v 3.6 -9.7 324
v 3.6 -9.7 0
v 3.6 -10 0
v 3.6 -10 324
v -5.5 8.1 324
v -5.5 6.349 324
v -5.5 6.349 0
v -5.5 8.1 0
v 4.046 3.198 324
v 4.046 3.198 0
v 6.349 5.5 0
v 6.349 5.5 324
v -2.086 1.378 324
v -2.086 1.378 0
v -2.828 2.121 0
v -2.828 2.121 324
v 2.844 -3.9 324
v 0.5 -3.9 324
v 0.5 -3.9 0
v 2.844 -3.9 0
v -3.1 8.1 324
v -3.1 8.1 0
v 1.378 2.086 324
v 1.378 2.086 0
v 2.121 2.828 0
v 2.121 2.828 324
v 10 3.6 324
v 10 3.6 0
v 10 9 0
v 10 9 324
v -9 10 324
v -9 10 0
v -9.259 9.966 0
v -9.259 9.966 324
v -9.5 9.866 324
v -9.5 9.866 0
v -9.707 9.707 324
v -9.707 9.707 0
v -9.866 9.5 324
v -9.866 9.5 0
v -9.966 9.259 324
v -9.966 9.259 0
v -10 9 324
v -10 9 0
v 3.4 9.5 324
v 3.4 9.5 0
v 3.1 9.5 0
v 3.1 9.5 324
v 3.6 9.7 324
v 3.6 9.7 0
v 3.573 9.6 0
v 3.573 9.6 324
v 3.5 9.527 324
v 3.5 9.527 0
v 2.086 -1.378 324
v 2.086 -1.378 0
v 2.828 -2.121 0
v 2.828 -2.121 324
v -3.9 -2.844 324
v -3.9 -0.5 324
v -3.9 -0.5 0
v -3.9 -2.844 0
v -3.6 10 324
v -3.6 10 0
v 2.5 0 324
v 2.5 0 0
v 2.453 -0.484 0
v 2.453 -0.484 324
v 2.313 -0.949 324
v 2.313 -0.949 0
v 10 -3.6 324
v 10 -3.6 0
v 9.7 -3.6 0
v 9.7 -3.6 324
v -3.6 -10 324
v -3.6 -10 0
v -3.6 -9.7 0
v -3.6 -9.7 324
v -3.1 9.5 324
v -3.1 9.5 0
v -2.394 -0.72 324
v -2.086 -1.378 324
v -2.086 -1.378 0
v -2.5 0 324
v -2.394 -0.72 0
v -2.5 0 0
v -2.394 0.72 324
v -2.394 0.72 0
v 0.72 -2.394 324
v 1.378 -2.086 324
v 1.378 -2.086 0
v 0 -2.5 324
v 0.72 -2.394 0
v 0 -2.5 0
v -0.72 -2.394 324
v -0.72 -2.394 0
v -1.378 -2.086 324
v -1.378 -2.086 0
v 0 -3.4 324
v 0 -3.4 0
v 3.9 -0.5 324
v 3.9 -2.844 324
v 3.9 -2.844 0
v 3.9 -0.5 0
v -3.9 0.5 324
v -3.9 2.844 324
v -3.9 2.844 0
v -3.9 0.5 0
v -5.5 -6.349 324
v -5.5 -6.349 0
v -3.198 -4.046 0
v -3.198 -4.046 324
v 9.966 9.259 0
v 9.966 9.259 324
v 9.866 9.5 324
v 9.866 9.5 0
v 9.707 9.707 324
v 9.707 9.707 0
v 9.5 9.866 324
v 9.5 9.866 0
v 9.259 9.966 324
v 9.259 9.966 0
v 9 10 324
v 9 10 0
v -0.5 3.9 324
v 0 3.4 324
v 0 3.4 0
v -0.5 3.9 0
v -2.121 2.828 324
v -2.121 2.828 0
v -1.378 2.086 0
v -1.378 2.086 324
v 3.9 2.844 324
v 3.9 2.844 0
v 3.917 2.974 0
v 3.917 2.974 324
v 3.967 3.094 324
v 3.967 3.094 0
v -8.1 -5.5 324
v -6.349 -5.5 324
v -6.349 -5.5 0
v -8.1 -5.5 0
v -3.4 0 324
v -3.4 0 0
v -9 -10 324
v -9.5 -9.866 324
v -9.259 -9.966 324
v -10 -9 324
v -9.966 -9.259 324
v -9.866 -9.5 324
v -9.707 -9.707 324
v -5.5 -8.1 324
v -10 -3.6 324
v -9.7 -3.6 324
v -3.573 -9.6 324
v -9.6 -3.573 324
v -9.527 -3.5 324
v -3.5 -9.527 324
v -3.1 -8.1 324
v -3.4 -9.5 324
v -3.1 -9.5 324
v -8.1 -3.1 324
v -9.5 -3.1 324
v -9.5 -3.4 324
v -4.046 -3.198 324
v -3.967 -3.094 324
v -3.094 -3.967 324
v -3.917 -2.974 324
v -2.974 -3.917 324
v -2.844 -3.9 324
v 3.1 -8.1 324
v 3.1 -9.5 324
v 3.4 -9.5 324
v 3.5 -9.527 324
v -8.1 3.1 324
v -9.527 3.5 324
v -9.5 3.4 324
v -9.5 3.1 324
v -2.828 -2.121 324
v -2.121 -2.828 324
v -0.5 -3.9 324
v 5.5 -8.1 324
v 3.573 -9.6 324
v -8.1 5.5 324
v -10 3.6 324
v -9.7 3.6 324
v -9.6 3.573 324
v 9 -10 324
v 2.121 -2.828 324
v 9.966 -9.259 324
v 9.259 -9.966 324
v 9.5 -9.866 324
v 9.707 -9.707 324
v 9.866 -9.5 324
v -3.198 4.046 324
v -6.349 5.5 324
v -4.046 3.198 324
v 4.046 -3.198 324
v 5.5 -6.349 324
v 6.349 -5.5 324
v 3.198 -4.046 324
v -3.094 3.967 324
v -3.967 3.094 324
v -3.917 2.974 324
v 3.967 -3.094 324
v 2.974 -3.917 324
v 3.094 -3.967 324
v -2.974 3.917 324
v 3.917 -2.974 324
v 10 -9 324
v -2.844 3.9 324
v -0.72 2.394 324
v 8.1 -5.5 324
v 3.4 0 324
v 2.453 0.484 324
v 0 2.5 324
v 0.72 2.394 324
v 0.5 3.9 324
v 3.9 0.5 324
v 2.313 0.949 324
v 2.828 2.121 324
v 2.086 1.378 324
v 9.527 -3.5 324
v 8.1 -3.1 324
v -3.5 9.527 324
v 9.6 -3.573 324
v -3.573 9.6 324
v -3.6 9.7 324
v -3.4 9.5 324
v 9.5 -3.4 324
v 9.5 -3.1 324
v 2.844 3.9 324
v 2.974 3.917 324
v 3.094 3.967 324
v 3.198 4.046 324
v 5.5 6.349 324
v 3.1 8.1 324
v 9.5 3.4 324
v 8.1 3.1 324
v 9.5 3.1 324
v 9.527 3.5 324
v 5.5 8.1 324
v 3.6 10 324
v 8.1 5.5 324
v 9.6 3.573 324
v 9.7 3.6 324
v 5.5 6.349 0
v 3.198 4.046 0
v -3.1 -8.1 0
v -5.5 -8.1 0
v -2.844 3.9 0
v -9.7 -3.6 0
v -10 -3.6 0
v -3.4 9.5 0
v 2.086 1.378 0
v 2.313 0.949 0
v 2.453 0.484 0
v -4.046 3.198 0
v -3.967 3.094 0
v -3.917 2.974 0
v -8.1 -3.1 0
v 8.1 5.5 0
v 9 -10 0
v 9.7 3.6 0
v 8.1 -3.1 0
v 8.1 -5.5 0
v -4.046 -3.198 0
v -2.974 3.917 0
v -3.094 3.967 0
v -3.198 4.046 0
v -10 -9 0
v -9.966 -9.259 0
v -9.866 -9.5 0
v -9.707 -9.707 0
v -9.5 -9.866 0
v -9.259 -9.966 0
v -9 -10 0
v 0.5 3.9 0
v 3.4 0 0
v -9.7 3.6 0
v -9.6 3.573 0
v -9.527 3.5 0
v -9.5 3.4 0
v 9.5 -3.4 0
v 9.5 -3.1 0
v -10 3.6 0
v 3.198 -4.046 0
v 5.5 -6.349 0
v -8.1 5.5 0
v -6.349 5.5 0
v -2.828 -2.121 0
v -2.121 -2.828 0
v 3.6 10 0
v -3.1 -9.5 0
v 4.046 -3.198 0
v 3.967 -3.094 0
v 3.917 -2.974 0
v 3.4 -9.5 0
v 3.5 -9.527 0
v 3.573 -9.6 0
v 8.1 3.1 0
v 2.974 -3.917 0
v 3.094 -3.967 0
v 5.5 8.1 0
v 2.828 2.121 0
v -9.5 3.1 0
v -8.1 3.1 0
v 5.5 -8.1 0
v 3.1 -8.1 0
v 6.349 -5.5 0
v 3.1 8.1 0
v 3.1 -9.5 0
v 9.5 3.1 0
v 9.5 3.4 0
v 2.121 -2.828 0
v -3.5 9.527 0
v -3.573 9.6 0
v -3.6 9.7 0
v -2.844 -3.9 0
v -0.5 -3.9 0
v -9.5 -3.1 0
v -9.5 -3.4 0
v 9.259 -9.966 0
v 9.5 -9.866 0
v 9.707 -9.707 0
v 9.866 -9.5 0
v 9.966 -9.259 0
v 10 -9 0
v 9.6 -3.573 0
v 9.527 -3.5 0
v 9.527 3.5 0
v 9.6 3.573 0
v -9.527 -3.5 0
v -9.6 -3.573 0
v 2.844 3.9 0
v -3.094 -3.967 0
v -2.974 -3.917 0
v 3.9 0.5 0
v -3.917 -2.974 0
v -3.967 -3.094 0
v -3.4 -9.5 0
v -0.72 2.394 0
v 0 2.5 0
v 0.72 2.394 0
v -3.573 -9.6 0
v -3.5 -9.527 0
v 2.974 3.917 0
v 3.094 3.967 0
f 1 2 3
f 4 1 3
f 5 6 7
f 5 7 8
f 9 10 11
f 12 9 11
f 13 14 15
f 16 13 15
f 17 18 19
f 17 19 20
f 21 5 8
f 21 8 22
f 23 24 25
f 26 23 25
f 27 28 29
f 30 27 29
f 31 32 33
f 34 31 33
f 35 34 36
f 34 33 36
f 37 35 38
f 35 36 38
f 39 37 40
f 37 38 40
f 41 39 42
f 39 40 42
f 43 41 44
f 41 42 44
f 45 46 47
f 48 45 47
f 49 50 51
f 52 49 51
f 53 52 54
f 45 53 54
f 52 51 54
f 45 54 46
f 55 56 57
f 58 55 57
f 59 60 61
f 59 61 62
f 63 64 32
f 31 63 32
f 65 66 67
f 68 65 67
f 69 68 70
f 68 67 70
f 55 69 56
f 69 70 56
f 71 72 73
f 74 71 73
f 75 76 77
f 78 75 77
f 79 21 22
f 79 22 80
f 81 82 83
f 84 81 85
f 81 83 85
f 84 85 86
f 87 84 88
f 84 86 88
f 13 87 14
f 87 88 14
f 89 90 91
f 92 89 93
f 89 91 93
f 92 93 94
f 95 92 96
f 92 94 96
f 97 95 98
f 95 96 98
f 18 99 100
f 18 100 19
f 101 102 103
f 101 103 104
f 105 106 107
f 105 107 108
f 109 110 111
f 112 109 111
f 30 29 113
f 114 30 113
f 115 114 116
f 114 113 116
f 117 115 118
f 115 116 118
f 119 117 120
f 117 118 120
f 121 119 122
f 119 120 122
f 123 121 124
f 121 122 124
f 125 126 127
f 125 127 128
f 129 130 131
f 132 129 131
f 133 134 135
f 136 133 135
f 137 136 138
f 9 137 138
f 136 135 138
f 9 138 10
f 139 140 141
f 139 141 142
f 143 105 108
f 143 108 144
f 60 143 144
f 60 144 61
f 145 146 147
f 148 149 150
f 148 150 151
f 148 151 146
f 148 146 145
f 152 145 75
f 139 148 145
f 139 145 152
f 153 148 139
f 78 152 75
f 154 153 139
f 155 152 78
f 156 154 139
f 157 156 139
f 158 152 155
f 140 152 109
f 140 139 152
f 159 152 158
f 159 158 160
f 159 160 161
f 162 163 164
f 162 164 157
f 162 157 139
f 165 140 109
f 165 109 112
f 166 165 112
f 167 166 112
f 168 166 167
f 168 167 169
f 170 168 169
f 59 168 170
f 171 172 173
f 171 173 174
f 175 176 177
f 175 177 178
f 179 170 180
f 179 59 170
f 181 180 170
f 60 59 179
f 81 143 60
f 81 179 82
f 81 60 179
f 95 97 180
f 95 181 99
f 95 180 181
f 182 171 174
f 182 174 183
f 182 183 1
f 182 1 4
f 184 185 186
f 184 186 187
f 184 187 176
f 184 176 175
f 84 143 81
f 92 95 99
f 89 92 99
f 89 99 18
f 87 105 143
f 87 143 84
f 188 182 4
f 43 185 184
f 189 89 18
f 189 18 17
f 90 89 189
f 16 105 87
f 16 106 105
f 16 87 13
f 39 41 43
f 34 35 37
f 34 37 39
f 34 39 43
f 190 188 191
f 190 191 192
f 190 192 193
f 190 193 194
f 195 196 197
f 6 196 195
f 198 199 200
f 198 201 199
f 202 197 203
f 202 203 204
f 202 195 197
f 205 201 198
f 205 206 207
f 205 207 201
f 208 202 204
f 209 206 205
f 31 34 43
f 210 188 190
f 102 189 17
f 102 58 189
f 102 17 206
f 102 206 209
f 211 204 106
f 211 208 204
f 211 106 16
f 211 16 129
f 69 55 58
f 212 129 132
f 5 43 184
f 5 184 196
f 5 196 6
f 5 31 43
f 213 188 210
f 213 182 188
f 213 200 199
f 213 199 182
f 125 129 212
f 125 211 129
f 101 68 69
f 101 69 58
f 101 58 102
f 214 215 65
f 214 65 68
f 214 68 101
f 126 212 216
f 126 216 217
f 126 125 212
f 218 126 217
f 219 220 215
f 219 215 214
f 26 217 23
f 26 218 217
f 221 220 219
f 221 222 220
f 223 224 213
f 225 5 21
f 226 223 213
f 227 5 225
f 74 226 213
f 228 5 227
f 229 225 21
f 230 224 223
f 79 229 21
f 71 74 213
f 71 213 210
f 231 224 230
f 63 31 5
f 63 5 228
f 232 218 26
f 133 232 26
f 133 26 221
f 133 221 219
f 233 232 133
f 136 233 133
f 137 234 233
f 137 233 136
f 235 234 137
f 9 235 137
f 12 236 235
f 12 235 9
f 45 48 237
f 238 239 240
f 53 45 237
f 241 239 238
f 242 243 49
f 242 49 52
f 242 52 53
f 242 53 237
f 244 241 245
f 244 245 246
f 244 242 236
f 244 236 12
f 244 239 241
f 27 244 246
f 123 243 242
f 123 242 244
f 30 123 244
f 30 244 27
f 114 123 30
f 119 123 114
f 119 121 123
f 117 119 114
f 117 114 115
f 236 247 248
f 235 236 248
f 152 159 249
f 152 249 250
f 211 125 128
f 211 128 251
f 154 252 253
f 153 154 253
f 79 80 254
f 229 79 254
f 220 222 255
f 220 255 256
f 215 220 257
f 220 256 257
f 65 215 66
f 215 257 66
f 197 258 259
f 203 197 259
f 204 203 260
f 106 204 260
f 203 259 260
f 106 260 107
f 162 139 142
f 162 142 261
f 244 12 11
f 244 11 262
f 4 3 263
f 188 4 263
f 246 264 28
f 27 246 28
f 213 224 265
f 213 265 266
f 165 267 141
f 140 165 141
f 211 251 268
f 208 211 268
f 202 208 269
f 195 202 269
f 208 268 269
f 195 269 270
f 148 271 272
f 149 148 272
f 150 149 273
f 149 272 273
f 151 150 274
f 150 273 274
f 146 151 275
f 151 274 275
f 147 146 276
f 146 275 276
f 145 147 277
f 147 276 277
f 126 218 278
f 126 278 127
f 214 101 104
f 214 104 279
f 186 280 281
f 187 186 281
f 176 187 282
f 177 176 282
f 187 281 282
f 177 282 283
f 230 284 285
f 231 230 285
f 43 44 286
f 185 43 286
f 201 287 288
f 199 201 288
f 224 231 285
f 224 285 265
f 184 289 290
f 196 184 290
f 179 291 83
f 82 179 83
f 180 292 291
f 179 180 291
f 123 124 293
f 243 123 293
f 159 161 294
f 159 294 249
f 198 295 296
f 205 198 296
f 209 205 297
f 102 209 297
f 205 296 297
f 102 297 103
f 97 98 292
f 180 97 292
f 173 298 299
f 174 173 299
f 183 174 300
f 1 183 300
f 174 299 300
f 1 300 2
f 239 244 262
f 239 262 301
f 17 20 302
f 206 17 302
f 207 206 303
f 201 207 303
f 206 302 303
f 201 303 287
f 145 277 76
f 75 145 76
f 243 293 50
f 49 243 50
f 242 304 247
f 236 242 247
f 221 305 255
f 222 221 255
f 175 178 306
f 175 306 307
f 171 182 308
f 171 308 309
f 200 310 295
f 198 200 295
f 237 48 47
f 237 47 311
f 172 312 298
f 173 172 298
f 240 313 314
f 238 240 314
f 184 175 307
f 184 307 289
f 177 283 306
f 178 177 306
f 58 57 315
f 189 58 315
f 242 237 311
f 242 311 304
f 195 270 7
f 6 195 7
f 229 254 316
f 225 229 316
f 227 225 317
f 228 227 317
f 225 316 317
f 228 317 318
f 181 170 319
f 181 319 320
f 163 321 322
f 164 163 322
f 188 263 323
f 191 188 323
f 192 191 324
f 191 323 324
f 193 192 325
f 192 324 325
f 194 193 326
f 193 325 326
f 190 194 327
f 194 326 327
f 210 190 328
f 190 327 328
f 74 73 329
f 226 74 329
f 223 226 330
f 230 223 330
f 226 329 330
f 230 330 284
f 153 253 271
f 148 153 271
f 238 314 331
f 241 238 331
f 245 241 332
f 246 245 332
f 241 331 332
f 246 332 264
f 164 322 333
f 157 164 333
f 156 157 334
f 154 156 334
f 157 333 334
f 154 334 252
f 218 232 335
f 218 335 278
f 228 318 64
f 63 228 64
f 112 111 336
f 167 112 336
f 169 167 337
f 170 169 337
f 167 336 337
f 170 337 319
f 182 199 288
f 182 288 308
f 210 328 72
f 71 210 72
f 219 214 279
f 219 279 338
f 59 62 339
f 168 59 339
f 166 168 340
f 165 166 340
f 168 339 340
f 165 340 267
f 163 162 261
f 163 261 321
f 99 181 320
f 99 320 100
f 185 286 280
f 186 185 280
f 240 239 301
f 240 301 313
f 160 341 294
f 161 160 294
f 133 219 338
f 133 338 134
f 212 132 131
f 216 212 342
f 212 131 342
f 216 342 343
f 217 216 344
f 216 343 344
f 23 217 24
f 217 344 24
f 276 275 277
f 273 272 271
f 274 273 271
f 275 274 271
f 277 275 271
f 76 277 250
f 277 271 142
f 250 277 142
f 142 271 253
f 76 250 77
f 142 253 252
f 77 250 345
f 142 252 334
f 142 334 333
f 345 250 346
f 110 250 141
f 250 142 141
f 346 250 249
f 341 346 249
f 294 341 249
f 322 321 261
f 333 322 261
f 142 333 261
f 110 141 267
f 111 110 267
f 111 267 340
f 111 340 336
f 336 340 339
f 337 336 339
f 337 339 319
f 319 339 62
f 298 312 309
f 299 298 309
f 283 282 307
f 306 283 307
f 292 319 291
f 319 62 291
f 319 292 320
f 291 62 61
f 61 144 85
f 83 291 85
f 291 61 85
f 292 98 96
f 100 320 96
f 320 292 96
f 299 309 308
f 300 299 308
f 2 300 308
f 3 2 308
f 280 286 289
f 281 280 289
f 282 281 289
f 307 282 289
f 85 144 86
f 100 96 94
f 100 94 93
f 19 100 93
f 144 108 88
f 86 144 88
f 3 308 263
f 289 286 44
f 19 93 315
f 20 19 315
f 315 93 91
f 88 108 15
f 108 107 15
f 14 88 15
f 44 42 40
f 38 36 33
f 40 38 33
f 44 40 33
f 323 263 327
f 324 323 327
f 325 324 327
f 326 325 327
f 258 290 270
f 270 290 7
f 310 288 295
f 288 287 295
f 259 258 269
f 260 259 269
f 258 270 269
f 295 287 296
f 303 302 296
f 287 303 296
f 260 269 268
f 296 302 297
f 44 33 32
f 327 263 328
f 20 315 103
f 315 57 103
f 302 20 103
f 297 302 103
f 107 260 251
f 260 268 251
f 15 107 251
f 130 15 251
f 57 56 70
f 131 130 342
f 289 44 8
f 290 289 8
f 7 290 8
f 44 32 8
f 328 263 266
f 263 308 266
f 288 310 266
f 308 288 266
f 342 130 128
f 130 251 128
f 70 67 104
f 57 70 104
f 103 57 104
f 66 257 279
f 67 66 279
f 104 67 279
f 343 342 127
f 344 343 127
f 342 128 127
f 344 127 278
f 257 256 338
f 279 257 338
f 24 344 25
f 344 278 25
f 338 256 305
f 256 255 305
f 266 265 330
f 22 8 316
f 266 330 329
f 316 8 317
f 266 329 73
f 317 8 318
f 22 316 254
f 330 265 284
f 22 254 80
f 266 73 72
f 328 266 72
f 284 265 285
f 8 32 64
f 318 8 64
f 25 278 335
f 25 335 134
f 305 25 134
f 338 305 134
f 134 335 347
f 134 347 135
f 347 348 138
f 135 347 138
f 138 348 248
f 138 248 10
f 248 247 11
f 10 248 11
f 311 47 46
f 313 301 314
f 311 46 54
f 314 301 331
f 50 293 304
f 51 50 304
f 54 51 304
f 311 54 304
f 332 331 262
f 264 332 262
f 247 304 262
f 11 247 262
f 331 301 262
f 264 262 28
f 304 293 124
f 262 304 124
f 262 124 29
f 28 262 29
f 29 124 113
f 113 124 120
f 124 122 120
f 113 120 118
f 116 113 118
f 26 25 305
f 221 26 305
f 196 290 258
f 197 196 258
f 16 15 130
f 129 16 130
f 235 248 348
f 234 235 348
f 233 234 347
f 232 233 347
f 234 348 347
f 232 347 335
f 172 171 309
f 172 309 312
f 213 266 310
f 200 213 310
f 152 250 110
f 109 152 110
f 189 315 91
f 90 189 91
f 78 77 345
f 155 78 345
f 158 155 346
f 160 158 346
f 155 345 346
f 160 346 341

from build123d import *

# Parameters (mm, degrees)
EXTRUDE1_DEPTH = 324


with BuildPart() as part:
    # Sketch1 → Extrude1 (new body)
    with BuildSketch(Plane.XY):
        with BuildLine():
            Line((0, 3.4), (-0.5, 3.9))
            Line((-0.5, 3.9), (-2.844365081, 3.9))
            ThreePointArc((-2.844365081, 3.9), (-3.035706798, 3.938060234), (-3.197918472, 4.046446609))
            Line((-3.197918472, 4.046446609), (-5.5, 6.348528137))
            Line((-5.5, 6.348528137), (-5.5, 8.1))
            Line((-5.5, 8.1), (-3.1, 8.1))
            Line((-3.1, 8.1), (-3.1, 9.5))
            Line((-3.1, 9.5), (-3.4, 9.5))
            ThreePointArc((-3.4, 9.5), (-3.541421356, 9.558578644), (-3.6, 9.7))
            Line((-3.6, 9.7), (-3.6, 10))
            Line((-3.6, 10), (-9, 10))
            ThreePointArc((-9, 10), (-9.707106781, 9.707106781), (-10, 9))
            Line((-10, 9), (-10, 3.6))
            Line((-10, 3.6), (-9.7, 3.6))
            ThreePointArc((-9.7, 3.6), (-9.558578644, 3.541421356), (-9.5, 3.4))
            Line((-9.5, 3.4), (-9.5, 3.1))
            Line((-9.5, 3.1), (-8.1, 3.1))
            Line((-8.1, 3.1), (-8.1, 5.5))
            Line((-8.1, 5.5), (-6.348528137, 5.5))
            Line((-6.348528137, 5.5), (-4.046446609, 3.197918472))
            ThreePointArc((-4.046446609, 3.197918472), (-3.938060234, 3.035706798), (-3.9, 2.844365081))
            Line((-3.9, 2.844365081), (-3.9, 0.5))
            Line((-3.9, 0.5), (-3.4, 0))
            Line((-3.4, 0), (-3.9, -0.5))
            Line((-3.9, -0.5), (-3.9, -2.844365081))
            ThreePointArc((-3.9, -2.844365081), (-3.938060234, -3.035706798), (-4.046446609, -3.197918472))
            Line((-4.046446609, -3.197918472), (-6.348528137, -5.5))
            Line((-6.348528137, -5.5), (-8.1, -5.5))
            Line((-8.1, -5.5), (-8.1, -3.1))
            Line((-8.1, -3.1), (-9.5, -3.1))
            Line((-9.5, -3.1), (-9.5, -3.4))
            ThreePointArc((-9.5, -3.4), (-9.558578644, -3.541421356), (-9.7, -3.6))
            Line((-9.7, -3.6), (-10, -3.6))
            Line((-10, -3.6), (-10, -9))
            ThreePointArc((-10, -9), (-9.707106781, -9.707106781), (-9, -10))
            Line((-9, -10), (-3.6, -10))
            Line((-3.6, -10), (-3.6, -9.7))
            ThreePointArc((-3.6, -9.7), (-3.541421356, -9.558578644), (-3.4, -9.5))
            Line((-3.4, -9.5), (-3.1, -9.5))
            Line((-3.1, -9.5), (-3.1, -8.1))
            Line((-3.1, -8.1), (-5.5, -8.1))
            Line((-5.5, -8.1), (-5.5, -6.348528137))
            Line((-5.5, -6.348528137), (-3.197918472, -4.046446609))
            ThreePointArc((-3.197918472, -4.046446609), (-3.035706798, -3.938060234), (-2.844365081, -3.9))
            Line((-2.844365081, -3.9), (-0.5, -3.9))
            Line((-0.5, -3.9), (0, -3.4))
            Line((0, -3.4), (0.5, -3.9))
            Line((0.5, -3.9), (2.844365081, -3.9))
            ThreePointArc((2.844365081, -3.9), (3.035706798, -3.938060234), (3.197918472, -4.046446609))
            Line((3.197918472, -4.046446609), (5.5, -6.348528137))
            Line((5.5, -6.348528137), (5.5, -8.1))
            Line((5.5, -8.1), (3.1, -8.1))
            Line((3.1, -8.1), (3.1, -9.5))
            Line((3.1, -9.5), (3.4, -9.5))
            ThreePointArc((3.4, -9.5), (3.541421356, -9.558578644), (3.6, -9.7))
            Line((3.6, -9.7), (3.6, -10))
            Line((3.6, -10), (9, -10))
            ThreePointArc((9, -10), (9.707106781, -9.707106781), (10, -9))
            Line((10, -9), (10, -3.6))
            Line((10, -3.6), (9.7, -3.6))
            ThreePointArc((9.7, -3.6), (9.558578644, -3.541421356), (9.5, -3.4))
            Line((9.5, -3.4), (9.5, -3.1))
            Line((9.5, -3.1), (8.1, -3.1))
            Line((8.1, -3.1), (8.1, -5.5))
            Line((8.1, -5.5), (6.348528137, -5.5))
            Line((6.348528137, -5.5), (4.046446609, -3.197918472))
            ThreePointArc((4.046446609, -3.197918472), (3.938060234, -3.035706798), (3.9, -2.844365081))
            Line((3.9, -2.844365081), (3.9, -0.5))
            Line((3.9, -0.5), (3.4, 0))
            Line((3.4, 0), (3.9, 0.5))
            Line((3.9, 0.5), (3.9, 2.844365081))
            ThreePointArc((3.9, 2.844365081), (3.938060234, 3.035706798), (4.046446609, 3.197918472))
            Line((4.046446609, 3.197918472), (6.348528137, 5.5))
            Line((6.348528137, 5.5), (8.1, 5.5))
            Line((8.1, 5.5), (8.1, 3.1))
            Line((8.1, 3.1), (9.5, 3.1))
            Line((9.5, 3.1), (9.5, 3.4))
            ThreePointArc((9.5, 3.4), (9.558578644, 3.541421356), (9.7, 3.6))
            Line((9.7, 3.6), (10, 3.6))
            Line((10, 3.6), (10, 9))
            ThreePointArc((10, 9), (9.707106781, 9.707106781), (9, 10))
            Line((9, 10), (3.6, 10))
            Line((3.6, 10), (3.6, 9.7))
            ThreePointArc((3.6, 9.7), (3.541421356, 9.558578644), (3.4, 9.5))
            Line((3.4, 9.5), (3.1, 9.5))
            Line((3.1, 9.5), (3.1, 8.1))
            Line((3.1, 8.1), (5.5, 8.1))
            Line((5.5, 8.1), (5.5, 6.348528137))
            Line((5.5, 6.348528137), (3.197918472, 4.046446609))
            ThreePointArc((3.197918472, 4.046446609), (3.035706798, 3.938060234), (2.844365081, 3.9))
            Line((2.844365081, 3.9), (0.5, 3.9))
            Line((0.5, 3.9), (0, 3.4))
        make_face()
        with BuildLine():
            ThreePointArc((2.5, 0), (2.394160656, -0.719718523), (2.085604198, -1.378497417))
            Line((2.085604198, -1.378497417), (2.828427125, -2.121320344))
            Line((2.828427125, -2.121320344), (2.121320344, -2.828427125))
            Line((2.121320344, -2.828427125), (1.378497417, -2.085604198))
            ThreePointArc((1.378497417, -2.085604198), (0, -2.5), (-1.378497417, -2.085604198))
            Line((-1.378497417, -2.085604198), (-2.121320344, -2.828427125))
            Line((-2.121320344, -2.828427125), (-2.828427125, -2.121320344))
            Line((-2.828427125, -2.121320344), (-2.085604198, -1.378497417))
            ThreePointArc((-2.085604198, -1.378497417), (-2.5, 0), (-2.085604198, 1.378497417))
            Line((-2.085604198, 1.378497417), (-2.828427125, 2.121320344))
            Line((-2.828427125, 2.121320344), (-2.121320344, 2.828427125))
            Line((-2.121320344, 2.828427125), (-1.378497417, 2.085604198))
            ThreePointArc((-1.378497417, 2.085604198), (0, 2.5), (1.378497417, 2.085604198))
            Line((1.378497417, 2.085604198), (2.121320344, 2.828427125))
            Line((2.121320344, 2.828427125), (2.828427125, 2.121320344))
            Line((2.828427125, 2.121320344), (2.085604198, 1.378497417))
            ThreePointArc((2.085604198, 1.378497417), (2.394160656, 0.719718523), (2.5, 0))
        make_face(mode=Mode.SUBTRACT)
    extrude(amount=EXTRUDE1_DEPTH)


solid = part.part
